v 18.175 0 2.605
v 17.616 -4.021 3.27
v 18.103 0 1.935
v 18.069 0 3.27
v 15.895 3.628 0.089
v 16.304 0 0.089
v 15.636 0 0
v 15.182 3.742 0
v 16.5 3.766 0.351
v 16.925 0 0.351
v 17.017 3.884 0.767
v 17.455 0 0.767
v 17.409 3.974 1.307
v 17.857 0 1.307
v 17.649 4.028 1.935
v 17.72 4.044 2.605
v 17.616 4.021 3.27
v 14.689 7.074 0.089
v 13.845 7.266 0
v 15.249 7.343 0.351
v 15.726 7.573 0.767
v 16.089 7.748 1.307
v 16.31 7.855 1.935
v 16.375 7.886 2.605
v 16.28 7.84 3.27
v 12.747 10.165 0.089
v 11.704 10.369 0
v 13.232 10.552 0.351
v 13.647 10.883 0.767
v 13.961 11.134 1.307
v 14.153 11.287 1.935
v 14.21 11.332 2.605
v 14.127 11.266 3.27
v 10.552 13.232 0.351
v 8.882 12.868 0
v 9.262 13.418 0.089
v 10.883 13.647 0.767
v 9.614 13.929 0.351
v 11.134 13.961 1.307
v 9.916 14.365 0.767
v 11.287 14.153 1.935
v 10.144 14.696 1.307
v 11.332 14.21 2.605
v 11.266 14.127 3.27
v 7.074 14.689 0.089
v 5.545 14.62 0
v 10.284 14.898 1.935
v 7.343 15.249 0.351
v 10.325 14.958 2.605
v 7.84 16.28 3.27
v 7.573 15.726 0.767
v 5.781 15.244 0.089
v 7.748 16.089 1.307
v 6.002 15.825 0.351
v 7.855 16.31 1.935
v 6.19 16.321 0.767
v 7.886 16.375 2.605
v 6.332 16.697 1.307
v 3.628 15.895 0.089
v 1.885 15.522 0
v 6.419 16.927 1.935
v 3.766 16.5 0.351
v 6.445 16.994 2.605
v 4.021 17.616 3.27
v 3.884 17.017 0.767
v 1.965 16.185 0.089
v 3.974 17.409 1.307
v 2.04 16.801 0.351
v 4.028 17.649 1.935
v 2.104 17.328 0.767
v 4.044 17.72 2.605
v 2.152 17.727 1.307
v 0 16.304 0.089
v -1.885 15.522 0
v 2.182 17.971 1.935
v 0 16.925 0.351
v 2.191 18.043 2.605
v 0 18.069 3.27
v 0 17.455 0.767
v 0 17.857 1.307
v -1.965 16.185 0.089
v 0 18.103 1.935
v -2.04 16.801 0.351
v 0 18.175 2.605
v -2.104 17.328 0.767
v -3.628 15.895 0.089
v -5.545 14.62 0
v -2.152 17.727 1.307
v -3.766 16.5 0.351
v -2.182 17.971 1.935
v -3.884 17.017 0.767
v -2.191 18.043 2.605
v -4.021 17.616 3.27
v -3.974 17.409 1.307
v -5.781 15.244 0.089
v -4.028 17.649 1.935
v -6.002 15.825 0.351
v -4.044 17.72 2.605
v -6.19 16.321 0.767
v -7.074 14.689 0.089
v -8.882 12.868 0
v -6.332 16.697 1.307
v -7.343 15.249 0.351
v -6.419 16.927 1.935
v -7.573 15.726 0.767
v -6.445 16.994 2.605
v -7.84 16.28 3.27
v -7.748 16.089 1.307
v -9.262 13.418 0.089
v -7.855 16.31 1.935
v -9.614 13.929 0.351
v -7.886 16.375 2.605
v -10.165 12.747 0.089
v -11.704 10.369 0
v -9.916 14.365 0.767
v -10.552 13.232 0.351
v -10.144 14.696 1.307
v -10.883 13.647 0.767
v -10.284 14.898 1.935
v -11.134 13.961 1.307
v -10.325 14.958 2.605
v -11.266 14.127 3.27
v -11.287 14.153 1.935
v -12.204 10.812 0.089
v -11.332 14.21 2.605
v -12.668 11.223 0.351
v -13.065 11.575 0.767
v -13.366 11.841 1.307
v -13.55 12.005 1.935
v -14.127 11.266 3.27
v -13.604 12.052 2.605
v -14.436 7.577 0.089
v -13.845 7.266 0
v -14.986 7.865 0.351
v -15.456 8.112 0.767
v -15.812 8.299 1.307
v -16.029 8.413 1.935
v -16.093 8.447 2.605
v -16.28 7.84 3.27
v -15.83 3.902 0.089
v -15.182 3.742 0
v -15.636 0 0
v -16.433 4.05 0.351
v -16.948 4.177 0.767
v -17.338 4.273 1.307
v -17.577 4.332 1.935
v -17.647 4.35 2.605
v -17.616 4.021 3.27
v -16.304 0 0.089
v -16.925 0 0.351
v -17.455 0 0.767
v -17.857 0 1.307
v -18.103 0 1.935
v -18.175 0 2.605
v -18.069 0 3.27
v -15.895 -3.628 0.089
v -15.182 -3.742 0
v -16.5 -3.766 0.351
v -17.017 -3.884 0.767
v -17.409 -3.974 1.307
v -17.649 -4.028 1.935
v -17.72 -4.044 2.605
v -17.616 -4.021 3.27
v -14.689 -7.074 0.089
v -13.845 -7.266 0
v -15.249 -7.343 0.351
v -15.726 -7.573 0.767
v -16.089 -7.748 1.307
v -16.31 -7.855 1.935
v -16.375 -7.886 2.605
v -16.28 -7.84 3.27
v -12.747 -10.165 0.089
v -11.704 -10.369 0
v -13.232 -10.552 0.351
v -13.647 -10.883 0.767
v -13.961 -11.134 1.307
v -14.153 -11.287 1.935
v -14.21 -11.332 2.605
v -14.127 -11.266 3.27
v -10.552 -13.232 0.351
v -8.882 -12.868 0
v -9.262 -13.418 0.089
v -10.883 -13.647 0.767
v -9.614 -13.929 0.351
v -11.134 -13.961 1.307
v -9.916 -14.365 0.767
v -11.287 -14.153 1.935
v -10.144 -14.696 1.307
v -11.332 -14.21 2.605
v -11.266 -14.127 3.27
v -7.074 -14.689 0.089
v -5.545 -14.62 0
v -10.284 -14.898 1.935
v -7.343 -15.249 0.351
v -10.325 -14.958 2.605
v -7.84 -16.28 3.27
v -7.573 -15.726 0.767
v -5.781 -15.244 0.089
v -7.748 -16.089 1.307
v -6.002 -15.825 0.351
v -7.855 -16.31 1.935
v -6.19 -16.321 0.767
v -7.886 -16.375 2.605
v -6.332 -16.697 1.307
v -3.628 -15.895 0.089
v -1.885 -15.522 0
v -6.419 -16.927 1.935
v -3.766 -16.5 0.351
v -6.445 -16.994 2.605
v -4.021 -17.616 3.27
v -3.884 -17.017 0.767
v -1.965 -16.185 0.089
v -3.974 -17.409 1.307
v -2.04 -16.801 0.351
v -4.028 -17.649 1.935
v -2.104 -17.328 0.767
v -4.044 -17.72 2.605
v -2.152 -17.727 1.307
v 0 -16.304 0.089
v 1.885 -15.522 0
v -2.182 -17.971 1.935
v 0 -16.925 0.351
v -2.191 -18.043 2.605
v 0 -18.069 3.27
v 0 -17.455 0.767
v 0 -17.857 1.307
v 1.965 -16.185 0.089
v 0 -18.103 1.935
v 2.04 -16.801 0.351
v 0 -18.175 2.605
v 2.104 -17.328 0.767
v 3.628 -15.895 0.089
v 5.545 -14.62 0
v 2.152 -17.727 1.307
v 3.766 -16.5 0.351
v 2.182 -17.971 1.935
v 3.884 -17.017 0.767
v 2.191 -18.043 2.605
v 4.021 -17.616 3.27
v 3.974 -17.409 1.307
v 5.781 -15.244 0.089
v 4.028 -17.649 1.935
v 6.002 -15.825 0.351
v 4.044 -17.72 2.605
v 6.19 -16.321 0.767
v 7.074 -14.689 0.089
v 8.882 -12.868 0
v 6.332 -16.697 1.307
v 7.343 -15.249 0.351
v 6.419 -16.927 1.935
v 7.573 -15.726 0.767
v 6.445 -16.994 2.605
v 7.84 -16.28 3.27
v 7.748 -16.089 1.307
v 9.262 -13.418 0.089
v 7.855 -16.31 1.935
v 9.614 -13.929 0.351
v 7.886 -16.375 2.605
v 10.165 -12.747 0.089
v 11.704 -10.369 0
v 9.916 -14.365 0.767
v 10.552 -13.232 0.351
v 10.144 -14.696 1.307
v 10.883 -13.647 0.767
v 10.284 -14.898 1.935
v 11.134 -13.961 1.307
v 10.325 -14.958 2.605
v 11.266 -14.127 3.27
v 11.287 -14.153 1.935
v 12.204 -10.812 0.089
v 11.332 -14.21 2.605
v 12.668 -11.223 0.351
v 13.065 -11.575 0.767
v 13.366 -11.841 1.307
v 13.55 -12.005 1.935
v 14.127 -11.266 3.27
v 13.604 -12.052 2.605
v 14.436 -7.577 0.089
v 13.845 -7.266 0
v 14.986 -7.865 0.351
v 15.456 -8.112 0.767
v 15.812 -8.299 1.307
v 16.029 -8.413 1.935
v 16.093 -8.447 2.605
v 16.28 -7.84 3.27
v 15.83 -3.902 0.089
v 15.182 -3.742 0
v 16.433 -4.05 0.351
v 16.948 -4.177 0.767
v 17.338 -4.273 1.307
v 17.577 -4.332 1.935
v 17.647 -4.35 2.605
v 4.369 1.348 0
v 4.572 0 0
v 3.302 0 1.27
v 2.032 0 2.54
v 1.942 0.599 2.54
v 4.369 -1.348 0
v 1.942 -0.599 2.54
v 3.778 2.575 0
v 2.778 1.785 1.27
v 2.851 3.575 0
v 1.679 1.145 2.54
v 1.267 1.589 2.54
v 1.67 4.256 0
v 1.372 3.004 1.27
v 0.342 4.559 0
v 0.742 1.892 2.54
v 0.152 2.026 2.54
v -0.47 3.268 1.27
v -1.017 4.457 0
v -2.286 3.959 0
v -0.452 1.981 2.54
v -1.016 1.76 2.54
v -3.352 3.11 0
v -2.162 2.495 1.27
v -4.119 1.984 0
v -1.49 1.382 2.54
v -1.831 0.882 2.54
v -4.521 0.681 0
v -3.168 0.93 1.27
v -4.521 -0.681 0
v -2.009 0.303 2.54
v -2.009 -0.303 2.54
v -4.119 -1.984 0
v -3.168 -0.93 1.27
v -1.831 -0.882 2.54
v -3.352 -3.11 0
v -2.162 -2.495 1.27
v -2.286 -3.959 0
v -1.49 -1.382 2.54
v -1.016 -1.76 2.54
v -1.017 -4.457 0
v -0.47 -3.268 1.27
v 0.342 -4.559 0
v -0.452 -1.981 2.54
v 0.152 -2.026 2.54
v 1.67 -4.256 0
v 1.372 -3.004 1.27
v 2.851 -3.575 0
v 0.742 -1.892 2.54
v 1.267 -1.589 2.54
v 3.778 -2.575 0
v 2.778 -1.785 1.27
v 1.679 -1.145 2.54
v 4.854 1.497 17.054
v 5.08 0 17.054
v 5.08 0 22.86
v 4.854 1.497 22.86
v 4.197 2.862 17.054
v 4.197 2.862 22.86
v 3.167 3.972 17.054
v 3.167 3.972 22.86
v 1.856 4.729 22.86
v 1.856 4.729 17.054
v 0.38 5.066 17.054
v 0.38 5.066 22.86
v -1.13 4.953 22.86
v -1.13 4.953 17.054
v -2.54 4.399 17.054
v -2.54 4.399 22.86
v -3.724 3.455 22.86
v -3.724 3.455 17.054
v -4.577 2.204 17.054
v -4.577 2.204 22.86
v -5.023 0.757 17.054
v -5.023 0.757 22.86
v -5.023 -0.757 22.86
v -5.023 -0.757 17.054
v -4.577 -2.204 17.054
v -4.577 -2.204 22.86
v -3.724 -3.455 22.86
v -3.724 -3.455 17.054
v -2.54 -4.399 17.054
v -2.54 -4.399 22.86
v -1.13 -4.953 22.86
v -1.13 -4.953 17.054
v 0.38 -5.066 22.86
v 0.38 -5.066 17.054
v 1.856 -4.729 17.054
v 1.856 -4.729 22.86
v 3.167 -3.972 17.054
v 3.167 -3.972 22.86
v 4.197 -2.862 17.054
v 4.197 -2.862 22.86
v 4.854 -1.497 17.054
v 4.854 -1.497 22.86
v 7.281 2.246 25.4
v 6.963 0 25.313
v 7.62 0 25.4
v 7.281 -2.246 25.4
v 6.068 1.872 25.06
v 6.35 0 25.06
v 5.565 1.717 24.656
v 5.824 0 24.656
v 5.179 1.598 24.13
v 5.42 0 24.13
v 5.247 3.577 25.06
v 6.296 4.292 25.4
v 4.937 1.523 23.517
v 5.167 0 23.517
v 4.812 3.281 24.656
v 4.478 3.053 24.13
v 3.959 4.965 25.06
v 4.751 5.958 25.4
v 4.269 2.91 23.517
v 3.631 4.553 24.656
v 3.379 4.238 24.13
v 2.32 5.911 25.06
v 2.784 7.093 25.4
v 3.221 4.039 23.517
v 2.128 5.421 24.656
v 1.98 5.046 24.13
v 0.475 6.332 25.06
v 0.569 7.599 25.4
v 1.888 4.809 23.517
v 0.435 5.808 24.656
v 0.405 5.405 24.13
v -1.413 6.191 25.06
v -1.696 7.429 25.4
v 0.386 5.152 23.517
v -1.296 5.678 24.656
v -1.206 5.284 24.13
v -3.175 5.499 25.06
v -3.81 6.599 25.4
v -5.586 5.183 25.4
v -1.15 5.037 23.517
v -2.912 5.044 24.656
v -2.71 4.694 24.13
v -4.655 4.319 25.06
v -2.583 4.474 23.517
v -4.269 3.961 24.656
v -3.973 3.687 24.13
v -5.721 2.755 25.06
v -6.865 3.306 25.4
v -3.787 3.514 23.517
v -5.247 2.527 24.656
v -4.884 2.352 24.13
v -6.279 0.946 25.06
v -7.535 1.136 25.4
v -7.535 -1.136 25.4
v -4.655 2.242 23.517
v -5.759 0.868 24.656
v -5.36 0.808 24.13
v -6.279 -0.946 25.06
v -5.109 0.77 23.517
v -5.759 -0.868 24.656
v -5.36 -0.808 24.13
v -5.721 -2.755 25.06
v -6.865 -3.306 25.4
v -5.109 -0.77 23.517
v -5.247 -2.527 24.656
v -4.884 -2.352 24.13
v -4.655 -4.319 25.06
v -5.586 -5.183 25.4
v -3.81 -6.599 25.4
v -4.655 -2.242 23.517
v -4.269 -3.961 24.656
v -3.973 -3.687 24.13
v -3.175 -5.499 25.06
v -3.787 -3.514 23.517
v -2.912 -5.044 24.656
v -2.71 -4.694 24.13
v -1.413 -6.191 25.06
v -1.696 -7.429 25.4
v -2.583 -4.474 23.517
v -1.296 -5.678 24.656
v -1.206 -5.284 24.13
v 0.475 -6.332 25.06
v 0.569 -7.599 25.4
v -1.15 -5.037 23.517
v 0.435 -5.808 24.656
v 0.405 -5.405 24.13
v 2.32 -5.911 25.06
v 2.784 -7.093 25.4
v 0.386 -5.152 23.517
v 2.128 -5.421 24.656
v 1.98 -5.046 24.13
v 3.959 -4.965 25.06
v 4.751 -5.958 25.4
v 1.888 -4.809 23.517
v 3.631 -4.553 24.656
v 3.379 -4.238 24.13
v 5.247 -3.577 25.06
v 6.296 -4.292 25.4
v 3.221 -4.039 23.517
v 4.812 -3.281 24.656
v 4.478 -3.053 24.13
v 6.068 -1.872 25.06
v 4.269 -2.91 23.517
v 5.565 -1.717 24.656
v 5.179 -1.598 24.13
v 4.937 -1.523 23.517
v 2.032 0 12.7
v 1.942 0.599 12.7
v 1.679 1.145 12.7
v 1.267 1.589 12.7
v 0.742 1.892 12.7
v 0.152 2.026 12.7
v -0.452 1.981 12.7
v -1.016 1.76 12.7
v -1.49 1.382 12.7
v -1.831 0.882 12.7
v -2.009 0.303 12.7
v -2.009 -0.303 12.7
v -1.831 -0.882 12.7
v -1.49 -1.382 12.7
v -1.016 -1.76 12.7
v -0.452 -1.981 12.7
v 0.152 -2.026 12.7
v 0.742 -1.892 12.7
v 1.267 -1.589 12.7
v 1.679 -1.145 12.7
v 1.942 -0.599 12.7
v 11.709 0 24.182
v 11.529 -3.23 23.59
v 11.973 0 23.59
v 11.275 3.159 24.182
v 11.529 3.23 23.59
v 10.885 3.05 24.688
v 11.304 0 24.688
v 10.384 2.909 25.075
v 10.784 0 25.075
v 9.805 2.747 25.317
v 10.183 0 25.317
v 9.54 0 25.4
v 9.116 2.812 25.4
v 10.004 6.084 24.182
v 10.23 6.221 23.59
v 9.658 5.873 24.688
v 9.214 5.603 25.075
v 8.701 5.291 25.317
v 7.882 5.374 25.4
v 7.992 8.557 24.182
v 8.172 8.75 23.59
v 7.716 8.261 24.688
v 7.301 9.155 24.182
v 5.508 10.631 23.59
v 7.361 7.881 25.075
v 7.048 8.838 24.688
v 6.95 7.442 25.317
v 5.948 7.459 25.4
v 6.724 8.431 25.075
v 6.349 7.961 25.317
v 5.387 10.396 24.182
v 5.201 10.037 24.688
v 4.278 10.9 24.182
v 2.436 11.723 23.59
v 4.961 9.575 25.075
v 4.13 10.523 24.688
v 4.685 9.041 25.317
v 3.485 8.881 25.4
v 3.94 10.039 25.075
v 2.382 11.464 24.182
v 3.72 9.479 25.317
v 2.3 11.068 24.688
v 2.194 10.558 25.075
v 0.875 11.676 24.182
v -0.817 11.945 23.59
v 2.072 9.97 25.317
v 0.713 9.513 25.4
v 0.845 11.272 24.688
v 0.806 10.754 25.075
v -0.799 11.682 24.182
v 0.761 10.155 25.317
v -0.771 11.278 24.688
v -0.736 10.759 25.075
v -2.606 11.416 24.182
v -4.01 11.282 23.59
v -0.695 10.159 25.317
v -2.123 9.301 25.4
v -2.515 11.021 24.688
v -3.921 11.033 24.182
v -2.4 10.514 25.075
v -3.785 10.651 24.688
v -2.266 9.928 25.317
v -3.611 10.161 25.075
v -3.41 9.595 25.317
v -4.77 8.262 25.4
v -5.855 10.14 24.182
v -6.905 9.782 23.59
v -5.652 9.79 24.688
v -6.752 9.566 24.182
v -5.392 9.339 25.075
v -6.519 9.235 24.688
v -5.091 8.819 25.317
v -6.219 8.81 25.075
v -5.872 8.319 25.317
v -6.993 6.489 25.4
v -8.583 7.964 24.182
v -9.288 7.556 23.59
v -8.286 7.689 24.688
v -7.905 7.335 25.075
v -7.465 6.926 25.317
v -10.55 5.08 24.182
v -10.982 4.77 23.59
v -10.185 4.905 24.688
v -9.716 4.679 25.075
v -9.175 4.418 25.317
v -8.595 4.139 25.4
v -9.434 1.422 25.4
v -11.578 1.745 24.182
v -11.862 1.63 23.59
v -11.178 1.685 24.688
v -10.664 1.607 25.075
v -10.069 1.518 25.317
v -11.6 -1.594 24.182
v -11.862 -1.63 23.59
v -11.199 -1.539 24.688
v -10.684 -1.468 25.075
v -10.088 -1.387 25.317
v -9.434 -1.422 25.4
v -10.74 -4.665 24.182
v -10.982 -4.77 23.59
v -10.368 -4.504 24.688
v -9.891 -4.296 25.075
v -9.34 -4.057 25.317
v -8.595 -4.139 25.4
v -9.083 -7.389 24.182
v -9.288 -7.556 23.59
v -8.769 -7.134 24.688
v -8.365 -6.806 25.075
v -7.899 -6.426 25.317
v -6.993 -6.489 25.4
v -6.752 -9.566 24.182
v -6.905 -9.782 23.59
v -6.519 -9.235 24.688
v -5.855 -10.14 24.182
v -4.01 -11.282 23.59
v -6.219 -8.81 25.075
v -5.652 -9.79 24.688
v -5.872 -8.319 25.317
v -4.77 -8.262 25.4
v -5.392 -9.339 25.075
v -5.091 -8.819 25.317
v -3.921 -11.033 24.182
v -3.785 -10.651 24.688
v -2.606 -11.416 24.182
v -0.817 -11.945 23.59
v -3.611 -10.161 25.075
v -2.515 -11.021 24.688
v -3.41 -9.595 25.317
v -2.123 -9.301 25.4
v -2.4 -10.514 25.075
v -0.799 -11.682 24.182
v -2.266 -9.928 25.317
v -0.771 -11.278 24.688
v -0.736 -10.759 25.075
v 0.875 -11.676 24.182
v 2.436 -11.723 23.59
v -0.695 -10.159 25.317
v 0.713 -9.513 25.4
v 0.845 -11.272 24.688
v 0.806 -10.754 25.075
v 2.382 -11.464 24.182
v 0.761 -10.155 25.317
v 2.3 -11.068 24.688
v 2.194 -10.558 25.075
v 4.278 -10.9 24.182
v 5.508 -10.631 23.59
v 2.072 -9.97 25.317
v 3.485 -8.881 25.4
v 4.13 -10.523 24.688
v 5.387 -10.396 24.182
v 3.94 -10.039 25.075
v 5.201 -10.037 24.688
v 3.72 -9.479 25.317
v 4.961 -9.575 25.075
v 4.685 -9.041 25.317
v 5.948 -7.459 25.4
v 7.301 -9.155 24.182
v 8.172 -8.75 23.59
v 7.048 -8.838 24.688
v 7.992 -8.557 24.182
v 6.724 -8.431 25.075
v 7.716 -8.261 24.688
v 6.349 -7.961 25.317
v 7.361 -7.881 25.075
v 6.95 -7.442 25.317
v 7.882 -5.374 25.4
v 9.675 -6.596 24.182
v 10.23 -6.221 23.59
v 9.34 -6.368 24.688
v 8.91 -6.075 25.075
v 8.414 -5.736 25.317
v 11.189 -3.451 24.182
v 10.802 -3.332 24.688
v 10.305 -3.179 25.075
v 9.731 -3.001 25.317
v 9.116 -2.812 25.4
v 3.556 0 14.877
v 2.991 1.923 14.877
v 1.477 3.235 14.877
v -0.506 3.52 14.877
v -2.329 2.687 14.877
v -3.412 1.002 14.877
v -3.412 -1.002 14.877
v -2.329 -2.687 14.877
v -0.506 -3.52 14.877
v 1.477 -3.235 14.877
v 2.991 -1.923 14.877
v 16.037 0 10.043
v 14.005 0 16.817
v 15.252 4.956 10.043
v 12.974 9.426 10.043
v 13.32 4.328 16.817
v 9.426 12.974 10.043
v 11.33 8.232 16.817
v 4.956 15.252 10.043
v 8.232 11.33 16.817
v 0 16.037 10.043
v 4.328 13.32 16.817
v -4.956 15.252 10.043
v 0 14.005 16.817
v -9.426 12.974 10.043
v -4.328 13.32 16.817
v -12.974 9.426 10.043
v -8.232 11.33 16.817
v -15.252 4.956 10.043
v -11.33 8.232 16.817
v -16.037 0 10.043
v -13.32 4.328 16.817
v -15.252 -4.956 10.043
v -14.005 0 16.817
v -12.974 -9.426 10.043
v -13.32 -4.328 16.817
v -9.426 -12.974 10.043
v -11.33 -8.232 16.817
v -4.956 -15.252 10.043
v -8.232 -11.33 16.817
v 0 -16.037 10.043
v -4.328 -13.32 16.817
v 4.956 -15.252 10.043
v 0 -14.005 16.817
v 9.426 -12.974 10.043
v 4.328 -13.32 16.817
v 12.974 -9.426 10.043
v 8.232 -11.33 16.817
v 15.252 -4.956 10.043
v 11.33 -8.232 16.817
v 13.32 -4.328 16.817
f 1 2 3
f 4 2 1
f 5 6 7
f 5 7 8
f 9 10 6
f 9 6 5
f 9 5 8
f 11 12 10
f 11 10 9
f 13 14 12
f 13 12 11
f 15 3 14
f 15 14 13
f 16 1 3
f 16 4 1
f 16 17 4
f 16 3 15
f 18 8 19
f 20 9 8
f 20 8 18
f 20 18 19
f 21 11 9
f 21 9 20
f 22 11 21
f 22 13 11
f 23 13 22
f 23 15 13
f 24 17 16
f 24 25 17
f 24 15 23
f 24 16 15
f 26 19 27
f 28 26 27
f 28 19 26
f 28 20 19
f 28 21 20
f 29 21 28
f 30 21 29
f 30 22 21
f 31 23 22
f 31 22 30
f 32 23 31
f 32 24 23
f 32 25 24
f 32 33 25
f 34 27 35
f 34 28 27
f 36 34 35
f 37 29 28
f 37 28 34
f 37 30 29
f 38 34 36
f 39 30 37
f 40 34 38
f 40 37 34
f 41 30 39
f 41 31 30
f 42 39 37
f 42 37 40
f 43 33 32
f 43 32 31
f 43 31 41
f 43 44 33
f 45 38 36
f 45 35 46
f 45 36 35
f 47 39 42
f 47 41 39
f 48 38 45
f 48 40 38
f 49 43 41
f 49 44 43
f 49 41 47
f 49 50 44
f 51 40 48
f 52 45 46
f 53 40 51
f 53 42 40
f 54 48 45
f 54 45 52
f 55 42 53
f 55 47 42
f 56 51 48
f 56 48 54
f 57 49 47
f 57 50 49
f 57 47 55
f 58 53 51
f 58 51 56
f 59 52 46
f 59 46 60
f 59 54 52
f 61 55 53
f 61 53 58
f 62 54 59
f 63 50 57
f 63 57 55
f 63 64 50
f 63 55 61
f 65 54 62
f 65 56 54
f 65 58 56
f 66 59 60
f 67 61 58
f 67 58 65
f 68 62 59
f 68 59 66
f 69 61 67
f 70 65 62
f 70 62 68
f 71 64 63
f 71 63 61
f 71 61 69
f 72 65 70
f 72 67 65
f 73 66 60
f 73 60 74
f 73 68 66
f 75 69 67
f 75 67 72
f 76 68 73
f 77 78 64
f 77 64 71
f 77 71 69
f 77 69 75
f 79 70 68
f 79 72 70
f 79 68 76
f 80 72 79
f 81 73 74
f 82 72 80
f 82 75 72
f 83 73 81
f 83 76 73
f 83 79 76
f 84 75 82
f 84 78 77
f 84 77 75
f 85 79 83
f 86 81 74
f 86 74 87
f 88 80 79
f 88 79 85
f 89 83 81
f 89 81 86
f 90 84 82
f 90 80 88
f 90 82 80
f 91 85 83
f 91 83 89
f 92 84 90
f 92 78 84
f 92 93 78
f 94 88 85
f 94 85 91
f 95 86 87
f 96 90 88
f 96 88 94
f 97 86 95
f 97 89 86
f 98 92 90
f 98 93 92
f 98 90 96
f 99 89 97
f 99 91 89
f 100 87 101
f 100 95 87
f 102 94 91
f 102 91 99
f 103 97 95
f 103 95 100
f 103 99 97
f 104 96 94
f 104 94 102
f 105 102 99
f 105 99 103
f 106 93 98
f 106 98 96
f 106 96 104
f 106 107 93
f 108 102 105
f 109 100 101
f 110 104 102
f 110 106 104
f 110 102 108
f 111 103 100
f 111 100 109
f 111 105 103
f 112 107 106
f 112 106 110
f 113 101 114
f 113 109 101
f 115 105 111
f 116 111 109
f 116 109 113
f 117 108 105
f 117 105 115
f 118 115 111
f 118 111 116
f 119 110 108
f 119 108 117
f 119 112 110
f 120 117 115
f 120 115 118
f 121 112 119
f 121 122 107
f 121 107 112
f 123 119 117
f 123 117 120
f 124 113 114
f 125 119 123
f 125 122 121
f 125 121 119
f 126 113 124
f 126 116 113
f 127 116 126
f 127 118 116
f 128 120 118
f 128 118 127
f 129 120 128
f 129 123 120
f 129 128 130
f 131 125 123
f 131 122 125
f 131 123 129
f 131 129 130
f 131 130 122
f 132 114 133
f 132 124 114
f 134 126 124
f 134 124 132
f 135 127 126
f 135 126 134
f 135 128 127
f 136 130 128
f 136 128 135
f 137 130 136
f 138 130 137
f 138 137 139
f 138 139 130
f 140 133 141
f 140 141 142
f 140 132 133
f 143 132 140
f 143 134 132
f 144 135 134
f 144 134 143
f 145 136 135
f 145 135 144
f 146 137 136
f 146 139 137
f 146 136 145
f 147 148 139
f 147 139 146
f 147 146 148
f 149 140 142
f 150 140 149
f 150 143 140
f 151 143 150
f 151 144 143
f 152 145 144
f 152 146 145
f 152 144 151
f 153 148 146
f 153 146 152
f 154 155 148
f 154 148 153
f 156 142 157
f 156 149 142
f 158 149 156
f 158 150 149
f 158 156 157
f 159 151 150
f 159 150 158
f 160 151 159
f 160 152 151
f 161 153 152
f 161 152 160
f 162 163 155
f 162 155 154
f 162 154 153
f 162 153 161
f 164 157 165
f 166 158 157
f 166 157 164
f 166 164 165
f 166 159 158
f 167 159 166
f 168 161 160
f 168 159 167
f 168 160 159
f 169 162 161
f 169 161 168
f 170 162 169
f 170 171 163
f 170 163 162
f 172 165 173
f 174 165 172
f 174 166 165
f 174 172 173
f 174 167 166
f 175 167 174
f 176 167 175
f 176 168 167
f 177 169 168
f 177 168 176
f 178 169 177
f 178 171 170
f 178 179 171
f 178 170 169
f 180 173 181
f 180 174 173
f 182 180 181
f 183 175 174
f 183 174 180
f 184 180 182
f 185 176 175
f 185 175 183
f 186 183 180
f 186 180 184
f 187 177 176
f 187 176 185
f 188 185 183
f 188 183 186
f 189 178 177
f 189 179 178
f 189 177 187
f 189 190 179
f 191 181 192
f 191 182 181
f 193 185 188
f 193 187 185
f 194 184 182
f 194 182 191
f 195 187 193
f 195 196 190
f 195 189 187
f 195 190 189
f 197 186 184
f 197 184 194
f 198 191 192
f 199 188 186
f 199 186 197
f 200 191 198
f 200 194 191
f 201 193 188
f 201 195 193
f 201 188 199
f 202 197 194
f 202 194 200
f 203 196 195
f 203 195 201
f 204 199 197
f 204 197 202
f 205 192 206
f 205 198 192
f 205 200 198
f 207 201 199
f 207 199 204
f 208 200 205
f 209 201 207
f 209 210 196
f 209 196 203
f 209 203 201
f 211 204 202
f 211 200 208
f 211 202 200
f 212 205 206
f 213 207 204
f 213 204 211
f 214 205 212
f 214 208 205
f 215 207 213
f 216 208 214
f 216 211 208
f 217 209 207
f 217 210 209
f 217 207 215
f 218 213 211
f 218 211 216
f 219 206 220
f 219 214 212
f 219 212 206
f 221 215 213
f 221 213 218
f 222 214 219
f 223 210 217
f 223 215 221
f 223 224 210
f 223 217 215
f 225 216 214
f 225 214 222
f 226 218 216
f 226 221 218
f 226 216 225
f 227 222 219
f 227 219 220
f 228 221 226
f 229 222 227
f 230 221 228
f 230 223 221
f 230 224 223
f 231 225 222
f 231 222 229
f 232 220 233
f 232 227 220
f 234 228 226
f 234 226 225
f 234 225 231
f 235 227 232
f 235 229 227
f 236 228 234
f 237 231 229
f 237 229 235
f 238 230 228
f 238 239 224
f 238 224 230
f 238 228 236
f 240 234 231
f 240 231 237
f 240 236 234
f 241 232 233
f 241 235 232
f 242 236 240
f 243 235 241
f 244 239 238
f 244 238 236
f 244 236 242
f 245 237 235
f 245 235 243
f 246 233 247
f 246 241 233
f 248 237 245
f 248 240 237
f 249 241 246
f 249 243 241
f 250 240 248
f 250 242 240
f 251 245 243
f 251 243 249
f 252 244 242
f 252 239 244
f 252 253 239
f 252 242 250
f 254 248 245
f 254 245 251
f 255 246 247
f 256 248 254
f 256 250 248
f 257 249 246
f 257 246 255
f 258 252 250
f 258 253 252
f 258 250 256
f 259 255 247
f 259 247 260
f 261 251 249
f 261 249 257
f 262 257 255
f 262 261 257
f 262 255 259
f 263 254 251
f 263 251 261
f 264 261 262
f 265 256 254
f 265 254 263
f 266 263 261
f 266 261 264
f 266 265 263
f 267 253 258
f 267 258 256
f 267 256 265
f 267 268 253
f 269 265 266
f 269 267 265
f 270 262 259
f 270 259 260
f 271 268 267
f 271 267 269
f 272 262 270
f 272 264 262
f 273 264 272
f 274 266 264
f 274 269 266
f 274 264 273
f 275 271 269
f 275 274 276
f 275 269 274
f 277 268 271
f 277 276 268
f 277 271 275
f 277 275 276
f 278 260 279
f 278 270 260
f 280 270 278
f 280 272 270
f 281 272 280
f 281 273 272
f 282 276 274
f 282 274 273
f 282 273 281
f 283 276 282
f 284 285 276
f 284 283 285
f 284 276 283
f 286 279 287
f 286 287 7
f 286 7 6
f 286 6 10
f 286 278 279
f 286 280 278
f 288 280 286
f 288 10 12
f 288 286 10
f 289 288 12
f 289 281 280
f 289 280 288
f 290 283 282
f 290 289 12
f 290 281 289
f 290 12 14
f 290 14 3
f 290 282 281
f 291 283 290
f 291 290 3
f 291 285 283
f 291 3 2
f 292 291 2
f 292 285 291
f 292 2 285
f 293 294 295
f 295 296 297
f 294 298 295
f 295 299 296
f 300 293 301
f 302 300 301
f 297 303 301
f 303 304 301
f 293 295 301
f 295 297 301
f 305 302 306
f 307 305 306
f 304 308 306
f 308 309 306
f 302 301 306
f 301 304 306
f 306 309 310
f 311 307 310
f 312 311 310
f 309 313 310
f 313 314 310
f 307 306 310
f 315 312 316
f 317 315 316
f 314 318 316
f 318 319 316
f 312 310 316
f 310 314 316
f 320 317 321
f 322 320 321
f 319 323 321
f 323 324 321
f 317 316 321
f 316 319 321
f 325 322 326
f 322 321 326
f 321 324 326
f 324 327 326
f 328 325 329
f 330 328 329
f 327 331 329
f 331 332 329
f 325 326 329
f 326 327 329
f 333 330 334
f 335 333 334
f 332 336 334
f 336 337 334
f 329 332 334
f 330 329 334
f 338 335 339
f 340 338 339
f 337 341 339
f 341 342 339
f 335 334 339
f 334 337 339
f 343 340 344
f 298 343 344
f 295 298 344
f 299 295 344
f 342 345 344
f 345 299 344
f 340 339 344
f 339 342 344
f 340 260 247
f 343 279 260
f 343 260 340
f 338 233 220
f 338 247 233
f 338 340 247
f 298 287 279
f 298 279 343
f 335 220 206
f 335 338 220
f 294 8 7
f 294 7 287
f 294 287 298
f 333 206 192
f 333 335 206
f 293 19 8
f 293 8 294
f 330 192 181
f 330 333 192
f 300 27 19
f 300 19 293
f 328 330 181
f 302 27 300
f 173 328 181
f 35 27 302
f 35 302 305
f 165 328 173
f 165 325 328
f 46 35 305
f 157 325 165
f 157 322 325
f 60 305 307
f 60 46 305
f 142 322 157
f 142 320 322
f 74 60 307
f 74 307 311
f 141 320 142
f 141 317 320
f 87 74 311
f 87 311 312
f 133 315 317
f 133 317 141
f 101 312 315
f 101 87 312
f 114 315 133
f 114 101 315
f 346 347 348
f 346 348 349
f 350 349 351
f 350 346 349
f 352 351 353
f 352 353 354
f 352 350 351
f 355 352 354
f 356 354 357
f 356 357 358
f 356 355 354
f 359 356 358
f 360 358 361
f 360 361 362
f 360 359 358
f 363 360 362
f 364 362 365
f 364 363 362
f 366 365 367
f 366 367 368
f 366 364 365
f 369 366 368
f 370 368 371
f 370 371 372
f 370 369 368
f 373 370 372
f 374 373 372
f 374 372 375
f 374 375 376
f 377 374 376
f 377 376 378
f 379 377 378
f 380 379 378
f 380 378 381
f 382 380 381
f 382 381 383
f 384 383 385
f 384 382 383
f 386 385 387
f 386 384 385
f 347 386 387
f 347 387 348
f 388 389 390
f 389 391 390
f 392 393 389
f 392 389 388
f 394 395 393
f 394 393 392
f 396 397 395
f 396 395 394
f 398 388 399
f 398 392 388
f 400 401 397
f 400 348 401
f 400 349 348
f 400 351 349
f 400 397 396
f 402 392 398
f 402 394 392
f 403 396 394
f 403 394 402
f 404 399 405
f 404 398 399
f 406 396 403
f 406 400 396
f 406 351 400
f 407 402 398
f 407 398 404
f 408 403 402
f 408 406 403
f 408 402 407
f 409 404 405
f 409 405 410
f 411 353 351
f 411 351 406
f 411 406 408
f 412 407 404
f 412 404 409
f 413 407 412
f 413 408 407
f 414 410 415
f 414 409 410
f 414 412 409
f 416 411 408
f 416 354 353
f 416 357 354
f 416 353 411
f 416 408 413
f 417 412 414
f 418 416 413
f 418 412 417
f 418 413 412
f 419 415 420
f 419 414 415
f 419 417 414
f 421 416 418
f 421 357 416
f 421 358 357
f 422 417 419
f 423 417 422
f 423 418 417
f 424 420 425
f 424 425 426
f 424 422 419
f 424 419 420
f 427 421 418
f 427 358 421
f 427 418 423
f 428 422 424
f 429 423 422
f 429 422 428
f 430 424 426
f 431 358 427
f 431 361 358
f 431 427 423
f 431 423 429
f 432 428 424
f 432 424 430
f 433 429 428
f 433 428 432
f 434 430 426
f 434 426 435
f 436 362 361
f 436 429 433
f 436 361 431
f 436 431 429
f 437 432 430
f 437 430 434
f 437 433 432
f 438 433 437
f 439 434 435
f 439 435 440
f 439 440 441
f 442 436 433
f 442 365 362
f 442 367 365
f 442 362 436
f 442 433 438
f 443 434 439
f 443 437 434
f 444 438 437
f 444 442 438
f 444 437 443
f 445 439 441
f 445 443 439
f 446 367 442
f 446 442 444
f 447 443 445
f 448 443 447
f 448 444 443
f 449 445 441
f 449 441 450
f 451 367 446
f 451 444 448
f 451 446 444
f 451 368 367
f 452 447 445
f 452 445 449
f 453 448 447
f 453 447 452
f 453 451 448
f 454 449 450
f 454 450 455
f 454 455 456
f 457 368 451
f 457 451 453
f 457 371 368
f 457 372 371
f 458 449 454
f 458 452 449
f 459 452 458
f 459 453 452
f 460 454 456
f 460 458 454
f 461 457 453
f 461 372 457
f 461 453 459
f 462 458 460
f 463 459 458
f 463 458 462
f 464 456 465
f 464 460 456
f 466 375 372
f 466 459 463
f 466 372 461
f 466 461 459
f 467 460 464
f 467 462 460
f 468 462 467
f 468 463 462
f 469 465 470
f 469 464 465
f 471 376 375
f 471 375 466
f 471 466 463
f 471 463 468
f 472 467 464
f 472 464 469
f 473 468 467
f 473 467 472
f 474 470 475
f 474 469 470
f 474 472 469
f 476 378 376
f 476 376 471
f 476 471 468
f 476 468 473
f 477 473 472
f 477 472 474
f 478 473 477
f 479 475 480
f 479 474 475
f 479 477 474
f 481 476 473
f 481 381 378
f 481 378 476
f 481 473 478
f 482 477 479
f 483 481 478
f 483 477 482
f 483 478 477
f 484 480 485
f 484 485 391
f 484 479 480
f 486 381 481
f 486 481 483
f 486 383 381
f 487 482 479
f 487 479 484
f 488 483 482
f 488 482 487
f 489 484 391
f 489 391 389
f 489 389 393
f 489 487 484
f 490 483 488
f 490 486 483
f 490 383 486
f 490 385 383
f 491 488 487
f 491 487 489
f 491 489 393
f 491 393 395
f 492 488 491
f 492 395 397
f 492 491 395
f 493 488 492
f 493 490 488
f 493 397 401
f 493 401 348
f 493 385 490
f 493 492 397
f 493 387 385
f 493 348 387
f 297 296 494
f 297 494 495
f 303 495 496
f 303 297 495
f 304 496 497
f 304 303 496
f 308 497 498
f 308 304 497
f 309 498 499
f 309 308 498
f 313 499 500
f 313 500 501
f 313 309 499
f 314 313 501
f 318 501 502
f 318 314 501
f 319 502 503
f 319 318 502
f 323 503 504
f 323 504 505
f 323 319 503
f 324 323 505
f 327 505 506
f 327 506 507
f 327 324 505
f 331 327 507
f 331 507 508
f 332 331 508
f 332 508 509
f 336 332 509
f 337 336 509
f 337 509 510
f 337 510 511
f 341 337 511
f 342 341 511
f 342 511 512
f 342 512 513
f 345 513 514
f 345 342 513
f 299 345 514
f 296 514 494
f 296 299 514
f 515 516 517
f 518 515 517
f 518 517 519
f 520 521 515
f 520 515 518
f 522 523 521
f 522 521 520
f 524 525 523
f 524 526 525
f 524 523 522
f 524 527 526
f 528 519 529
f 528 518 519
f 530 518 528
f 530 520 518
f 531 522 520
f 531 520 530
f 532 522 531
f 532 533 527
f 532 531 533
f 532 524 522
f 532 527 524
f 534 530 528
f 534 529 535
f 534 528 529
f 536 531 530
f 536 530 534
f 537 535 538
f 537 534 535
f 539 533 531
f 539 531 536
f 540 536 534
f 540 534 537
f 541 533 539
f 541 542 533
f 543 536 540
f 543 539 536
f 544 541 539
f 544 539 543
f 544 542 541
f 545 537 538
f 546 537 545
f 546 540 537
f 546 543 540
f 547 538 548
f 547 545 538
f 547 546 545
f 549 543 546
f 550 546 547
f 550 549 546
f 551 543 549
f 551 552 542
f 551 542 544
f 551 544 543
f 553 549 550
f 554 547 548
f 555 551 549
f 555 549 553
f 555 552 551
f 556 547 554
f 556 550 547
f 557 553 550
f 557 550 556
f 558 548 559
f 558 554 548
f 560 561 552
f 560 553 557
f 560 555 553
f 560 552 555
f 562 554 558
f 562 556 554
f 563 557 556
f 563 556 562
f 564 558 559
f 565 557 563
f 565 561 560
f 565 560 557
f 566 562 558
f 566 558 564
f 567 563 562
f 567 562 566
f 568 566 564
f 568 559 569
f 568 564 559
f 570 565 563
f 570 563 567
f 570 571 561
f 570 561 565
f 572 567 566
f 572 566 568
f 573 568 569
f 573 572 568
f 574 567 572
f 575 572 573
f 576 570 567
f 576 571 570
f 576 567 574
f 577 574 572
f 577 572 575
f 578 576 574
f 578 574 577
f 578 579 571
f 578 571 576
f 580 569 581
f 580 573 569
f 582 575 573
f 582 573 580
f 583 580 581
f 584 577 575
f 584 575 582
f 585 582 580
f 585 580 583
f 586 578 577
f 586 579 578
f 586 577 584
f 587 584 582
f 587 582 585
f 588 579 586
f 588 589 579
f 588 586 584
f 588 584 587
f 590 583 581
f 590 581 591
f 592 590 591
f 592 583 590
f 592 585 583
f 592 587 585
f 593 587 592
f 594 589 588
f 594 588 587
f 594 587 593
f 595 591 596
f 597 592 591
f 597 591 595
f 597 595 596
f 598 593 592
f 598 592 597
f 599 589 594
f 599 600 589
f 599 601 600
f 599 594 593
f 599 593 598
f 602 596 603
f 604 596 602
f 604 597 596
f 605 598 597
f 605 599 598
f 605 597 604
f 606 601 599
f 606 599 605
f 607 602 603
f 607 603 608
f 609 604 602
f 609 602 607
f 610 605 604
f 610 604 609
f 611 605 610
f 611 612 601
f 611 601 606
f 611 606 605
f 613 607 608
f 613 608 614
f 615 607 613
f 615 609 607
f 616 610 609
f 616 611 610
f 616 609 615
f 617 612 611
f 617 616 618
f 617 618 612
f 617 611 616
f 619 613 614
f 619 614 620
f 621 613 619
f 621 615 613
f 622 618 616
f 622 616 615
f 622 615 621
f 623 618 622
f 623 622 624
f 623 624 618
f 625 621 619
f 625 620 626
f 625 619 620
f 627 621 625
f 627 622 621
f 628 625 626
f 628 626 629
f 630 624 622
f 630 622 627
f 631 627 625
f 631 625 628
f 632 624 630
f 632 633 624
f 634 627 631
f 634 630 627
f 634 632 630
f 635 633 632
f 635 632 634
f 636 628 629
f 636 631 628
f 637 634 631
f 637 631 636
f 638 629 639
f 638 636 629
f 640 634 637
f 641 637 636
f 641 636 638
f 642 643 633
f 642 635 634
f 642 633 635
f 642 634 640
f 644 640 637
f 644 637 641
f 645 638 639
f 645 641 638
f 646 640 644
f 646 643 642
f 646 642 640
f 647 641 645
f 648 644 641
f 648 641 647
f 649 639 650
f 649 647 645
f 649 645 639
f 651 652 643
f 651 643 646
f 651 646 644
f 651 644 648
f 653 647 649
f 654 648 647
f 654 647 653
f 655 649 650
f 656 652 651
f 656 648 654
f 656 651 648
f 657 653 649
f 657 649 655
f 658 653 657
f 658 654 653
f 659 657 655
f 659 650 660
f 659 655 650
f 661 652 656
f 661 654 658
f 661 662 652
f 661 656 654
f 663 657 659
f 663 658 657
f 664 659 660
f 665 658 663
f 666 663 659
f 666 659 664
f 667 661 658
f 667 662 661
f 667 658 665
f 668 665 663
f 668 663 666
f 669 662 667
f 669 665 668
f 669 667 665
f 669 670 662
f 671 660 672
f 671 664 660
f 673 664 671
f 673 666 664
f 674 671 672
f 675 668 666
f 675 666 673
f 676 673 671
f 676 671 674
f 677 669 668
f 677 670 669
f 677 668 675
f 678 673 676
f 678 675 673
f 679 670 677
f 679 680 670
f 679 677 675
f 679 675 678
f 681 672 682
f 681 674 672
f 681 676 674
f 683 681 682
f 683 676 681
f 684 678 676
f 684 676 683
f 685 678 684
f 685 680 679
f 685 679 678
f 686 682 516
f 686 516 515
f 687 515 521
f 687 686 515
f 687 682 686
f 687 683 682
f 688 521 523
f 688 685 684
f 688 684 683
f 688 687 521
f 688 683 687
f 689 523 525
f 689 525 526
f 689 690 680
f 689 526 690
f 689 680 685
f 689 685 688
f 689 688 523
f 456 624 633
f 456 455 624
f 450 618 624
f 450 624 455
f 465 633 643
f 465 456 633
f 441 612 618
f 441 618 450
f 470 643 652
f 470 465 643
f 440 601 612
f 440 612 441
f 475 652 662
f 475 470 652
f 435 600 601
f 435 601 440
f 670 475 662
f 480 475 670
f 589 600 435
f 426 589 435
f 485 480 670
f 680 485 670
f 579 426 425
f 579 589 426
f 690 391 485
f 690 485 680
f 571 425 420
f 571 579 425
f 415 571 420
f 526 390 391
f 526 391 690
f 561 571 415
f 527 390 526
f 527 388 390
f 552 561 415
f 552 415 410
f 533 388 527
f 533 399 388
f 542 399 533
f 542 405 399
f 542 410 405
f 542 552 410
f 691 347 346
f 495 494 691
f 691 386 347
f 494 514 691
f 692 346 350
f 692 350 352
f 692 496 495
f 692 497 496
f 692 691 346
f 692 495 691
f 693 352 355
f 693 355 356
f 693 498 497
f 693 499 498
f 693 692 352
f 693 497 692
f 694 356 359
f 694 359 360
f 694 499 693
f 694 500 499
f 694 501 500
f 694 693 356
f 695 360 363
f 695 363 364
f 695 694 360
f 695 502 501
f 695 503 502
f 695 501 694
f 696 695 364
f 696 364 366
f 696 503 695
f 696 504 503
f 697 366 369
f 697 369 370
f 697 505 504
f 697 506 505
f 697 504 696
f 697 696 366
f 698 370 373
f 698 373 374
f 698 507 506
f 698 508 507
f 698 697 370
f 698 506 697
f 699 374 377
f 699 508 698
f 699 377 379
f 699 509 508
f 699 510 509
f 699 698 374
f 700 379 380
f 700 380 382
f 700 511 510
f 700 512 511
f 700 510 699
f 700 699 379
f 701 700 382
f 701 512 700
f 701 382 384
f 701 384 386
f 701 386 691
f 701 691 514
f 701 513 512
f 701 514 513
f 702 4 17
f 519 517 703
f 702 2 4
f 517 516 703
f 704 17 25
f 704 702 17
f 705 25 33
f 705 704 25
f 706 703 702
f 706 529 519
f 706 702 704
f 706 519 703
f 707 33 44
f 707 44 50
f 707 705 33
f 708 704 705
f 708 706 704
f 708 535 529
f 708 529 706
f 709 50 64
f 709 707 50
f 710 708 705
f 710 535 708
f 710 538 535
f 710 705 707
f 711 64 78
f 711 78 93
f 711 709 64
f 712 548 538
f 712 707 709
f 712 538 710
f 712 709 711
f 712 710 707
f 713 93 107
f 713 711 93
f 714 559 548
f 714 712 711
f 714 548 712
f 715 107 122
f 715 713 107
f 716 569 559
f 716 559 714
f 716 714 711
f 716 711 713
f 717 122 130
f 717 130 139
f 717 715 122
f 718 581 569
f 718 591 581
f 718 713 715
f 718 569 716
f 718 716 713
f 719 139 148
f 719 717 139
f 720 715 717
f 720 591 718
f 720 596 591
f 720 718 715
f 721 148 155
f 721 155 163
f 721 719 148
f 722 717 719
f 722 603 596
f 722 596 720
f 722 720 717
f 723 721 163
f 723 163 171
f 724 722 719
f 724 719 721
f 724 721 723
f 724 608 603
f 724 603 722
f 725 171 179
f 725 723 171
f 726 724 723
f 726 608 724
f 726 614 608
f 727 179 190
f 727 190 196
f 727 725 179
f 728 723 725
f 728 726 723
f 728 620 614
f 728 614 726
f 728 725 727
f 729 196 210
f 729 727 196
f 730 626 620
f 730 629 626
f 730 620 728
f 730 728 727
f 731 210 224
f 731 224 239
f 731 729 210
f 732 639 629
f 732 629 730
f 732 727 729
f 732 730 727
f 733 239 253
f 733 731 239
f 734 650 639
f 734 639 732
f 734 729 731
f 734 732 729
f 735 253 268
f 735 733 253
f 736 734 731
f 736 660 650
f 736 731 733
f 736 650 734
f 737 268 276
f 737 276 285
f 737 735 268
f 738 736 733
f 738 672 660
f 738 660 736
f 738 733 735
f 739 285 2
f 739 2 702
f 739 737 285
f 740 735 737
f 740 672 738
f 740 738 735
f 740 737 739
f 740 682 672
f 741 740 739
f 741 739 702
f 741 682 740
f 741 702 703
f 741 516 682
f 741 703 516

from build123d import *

# Parameters (mm, degrees)
F3_R    = 2.54
F4_SIZE = 2.54


with BuildPart() as f2:
    # F0 (on Front) → F2 (revolve)
    with BuildSketch(Plane.XZ):
        Polygon((2.032, 12.7), (2.032, 0), (19.05, 0), (11.43, 25.4), (5.08, 25.4), (5.08, 17.054286), align=None)
    revolve(axis=Axis((0, 0, 16.681224), (0, 0, 1)))

    # F3
    f3_edges = [f2.edges().sort_by_distance(p)[0] for p in [
        (-11.43, 0, 25.4),
        (-5.08, 0, 25.4),
        (-19.05, 0, 0),
    ]]
    fillet(f3_edges, radius=F3_R)

    # F4
    f4_edges = [f2.edges().sort_by_distance(p)[0] for p in [
        (-2.032, 0, 0),
    ]]
    chamfer(f4_edges, length=F4_SIZE)


solid = f2.part
